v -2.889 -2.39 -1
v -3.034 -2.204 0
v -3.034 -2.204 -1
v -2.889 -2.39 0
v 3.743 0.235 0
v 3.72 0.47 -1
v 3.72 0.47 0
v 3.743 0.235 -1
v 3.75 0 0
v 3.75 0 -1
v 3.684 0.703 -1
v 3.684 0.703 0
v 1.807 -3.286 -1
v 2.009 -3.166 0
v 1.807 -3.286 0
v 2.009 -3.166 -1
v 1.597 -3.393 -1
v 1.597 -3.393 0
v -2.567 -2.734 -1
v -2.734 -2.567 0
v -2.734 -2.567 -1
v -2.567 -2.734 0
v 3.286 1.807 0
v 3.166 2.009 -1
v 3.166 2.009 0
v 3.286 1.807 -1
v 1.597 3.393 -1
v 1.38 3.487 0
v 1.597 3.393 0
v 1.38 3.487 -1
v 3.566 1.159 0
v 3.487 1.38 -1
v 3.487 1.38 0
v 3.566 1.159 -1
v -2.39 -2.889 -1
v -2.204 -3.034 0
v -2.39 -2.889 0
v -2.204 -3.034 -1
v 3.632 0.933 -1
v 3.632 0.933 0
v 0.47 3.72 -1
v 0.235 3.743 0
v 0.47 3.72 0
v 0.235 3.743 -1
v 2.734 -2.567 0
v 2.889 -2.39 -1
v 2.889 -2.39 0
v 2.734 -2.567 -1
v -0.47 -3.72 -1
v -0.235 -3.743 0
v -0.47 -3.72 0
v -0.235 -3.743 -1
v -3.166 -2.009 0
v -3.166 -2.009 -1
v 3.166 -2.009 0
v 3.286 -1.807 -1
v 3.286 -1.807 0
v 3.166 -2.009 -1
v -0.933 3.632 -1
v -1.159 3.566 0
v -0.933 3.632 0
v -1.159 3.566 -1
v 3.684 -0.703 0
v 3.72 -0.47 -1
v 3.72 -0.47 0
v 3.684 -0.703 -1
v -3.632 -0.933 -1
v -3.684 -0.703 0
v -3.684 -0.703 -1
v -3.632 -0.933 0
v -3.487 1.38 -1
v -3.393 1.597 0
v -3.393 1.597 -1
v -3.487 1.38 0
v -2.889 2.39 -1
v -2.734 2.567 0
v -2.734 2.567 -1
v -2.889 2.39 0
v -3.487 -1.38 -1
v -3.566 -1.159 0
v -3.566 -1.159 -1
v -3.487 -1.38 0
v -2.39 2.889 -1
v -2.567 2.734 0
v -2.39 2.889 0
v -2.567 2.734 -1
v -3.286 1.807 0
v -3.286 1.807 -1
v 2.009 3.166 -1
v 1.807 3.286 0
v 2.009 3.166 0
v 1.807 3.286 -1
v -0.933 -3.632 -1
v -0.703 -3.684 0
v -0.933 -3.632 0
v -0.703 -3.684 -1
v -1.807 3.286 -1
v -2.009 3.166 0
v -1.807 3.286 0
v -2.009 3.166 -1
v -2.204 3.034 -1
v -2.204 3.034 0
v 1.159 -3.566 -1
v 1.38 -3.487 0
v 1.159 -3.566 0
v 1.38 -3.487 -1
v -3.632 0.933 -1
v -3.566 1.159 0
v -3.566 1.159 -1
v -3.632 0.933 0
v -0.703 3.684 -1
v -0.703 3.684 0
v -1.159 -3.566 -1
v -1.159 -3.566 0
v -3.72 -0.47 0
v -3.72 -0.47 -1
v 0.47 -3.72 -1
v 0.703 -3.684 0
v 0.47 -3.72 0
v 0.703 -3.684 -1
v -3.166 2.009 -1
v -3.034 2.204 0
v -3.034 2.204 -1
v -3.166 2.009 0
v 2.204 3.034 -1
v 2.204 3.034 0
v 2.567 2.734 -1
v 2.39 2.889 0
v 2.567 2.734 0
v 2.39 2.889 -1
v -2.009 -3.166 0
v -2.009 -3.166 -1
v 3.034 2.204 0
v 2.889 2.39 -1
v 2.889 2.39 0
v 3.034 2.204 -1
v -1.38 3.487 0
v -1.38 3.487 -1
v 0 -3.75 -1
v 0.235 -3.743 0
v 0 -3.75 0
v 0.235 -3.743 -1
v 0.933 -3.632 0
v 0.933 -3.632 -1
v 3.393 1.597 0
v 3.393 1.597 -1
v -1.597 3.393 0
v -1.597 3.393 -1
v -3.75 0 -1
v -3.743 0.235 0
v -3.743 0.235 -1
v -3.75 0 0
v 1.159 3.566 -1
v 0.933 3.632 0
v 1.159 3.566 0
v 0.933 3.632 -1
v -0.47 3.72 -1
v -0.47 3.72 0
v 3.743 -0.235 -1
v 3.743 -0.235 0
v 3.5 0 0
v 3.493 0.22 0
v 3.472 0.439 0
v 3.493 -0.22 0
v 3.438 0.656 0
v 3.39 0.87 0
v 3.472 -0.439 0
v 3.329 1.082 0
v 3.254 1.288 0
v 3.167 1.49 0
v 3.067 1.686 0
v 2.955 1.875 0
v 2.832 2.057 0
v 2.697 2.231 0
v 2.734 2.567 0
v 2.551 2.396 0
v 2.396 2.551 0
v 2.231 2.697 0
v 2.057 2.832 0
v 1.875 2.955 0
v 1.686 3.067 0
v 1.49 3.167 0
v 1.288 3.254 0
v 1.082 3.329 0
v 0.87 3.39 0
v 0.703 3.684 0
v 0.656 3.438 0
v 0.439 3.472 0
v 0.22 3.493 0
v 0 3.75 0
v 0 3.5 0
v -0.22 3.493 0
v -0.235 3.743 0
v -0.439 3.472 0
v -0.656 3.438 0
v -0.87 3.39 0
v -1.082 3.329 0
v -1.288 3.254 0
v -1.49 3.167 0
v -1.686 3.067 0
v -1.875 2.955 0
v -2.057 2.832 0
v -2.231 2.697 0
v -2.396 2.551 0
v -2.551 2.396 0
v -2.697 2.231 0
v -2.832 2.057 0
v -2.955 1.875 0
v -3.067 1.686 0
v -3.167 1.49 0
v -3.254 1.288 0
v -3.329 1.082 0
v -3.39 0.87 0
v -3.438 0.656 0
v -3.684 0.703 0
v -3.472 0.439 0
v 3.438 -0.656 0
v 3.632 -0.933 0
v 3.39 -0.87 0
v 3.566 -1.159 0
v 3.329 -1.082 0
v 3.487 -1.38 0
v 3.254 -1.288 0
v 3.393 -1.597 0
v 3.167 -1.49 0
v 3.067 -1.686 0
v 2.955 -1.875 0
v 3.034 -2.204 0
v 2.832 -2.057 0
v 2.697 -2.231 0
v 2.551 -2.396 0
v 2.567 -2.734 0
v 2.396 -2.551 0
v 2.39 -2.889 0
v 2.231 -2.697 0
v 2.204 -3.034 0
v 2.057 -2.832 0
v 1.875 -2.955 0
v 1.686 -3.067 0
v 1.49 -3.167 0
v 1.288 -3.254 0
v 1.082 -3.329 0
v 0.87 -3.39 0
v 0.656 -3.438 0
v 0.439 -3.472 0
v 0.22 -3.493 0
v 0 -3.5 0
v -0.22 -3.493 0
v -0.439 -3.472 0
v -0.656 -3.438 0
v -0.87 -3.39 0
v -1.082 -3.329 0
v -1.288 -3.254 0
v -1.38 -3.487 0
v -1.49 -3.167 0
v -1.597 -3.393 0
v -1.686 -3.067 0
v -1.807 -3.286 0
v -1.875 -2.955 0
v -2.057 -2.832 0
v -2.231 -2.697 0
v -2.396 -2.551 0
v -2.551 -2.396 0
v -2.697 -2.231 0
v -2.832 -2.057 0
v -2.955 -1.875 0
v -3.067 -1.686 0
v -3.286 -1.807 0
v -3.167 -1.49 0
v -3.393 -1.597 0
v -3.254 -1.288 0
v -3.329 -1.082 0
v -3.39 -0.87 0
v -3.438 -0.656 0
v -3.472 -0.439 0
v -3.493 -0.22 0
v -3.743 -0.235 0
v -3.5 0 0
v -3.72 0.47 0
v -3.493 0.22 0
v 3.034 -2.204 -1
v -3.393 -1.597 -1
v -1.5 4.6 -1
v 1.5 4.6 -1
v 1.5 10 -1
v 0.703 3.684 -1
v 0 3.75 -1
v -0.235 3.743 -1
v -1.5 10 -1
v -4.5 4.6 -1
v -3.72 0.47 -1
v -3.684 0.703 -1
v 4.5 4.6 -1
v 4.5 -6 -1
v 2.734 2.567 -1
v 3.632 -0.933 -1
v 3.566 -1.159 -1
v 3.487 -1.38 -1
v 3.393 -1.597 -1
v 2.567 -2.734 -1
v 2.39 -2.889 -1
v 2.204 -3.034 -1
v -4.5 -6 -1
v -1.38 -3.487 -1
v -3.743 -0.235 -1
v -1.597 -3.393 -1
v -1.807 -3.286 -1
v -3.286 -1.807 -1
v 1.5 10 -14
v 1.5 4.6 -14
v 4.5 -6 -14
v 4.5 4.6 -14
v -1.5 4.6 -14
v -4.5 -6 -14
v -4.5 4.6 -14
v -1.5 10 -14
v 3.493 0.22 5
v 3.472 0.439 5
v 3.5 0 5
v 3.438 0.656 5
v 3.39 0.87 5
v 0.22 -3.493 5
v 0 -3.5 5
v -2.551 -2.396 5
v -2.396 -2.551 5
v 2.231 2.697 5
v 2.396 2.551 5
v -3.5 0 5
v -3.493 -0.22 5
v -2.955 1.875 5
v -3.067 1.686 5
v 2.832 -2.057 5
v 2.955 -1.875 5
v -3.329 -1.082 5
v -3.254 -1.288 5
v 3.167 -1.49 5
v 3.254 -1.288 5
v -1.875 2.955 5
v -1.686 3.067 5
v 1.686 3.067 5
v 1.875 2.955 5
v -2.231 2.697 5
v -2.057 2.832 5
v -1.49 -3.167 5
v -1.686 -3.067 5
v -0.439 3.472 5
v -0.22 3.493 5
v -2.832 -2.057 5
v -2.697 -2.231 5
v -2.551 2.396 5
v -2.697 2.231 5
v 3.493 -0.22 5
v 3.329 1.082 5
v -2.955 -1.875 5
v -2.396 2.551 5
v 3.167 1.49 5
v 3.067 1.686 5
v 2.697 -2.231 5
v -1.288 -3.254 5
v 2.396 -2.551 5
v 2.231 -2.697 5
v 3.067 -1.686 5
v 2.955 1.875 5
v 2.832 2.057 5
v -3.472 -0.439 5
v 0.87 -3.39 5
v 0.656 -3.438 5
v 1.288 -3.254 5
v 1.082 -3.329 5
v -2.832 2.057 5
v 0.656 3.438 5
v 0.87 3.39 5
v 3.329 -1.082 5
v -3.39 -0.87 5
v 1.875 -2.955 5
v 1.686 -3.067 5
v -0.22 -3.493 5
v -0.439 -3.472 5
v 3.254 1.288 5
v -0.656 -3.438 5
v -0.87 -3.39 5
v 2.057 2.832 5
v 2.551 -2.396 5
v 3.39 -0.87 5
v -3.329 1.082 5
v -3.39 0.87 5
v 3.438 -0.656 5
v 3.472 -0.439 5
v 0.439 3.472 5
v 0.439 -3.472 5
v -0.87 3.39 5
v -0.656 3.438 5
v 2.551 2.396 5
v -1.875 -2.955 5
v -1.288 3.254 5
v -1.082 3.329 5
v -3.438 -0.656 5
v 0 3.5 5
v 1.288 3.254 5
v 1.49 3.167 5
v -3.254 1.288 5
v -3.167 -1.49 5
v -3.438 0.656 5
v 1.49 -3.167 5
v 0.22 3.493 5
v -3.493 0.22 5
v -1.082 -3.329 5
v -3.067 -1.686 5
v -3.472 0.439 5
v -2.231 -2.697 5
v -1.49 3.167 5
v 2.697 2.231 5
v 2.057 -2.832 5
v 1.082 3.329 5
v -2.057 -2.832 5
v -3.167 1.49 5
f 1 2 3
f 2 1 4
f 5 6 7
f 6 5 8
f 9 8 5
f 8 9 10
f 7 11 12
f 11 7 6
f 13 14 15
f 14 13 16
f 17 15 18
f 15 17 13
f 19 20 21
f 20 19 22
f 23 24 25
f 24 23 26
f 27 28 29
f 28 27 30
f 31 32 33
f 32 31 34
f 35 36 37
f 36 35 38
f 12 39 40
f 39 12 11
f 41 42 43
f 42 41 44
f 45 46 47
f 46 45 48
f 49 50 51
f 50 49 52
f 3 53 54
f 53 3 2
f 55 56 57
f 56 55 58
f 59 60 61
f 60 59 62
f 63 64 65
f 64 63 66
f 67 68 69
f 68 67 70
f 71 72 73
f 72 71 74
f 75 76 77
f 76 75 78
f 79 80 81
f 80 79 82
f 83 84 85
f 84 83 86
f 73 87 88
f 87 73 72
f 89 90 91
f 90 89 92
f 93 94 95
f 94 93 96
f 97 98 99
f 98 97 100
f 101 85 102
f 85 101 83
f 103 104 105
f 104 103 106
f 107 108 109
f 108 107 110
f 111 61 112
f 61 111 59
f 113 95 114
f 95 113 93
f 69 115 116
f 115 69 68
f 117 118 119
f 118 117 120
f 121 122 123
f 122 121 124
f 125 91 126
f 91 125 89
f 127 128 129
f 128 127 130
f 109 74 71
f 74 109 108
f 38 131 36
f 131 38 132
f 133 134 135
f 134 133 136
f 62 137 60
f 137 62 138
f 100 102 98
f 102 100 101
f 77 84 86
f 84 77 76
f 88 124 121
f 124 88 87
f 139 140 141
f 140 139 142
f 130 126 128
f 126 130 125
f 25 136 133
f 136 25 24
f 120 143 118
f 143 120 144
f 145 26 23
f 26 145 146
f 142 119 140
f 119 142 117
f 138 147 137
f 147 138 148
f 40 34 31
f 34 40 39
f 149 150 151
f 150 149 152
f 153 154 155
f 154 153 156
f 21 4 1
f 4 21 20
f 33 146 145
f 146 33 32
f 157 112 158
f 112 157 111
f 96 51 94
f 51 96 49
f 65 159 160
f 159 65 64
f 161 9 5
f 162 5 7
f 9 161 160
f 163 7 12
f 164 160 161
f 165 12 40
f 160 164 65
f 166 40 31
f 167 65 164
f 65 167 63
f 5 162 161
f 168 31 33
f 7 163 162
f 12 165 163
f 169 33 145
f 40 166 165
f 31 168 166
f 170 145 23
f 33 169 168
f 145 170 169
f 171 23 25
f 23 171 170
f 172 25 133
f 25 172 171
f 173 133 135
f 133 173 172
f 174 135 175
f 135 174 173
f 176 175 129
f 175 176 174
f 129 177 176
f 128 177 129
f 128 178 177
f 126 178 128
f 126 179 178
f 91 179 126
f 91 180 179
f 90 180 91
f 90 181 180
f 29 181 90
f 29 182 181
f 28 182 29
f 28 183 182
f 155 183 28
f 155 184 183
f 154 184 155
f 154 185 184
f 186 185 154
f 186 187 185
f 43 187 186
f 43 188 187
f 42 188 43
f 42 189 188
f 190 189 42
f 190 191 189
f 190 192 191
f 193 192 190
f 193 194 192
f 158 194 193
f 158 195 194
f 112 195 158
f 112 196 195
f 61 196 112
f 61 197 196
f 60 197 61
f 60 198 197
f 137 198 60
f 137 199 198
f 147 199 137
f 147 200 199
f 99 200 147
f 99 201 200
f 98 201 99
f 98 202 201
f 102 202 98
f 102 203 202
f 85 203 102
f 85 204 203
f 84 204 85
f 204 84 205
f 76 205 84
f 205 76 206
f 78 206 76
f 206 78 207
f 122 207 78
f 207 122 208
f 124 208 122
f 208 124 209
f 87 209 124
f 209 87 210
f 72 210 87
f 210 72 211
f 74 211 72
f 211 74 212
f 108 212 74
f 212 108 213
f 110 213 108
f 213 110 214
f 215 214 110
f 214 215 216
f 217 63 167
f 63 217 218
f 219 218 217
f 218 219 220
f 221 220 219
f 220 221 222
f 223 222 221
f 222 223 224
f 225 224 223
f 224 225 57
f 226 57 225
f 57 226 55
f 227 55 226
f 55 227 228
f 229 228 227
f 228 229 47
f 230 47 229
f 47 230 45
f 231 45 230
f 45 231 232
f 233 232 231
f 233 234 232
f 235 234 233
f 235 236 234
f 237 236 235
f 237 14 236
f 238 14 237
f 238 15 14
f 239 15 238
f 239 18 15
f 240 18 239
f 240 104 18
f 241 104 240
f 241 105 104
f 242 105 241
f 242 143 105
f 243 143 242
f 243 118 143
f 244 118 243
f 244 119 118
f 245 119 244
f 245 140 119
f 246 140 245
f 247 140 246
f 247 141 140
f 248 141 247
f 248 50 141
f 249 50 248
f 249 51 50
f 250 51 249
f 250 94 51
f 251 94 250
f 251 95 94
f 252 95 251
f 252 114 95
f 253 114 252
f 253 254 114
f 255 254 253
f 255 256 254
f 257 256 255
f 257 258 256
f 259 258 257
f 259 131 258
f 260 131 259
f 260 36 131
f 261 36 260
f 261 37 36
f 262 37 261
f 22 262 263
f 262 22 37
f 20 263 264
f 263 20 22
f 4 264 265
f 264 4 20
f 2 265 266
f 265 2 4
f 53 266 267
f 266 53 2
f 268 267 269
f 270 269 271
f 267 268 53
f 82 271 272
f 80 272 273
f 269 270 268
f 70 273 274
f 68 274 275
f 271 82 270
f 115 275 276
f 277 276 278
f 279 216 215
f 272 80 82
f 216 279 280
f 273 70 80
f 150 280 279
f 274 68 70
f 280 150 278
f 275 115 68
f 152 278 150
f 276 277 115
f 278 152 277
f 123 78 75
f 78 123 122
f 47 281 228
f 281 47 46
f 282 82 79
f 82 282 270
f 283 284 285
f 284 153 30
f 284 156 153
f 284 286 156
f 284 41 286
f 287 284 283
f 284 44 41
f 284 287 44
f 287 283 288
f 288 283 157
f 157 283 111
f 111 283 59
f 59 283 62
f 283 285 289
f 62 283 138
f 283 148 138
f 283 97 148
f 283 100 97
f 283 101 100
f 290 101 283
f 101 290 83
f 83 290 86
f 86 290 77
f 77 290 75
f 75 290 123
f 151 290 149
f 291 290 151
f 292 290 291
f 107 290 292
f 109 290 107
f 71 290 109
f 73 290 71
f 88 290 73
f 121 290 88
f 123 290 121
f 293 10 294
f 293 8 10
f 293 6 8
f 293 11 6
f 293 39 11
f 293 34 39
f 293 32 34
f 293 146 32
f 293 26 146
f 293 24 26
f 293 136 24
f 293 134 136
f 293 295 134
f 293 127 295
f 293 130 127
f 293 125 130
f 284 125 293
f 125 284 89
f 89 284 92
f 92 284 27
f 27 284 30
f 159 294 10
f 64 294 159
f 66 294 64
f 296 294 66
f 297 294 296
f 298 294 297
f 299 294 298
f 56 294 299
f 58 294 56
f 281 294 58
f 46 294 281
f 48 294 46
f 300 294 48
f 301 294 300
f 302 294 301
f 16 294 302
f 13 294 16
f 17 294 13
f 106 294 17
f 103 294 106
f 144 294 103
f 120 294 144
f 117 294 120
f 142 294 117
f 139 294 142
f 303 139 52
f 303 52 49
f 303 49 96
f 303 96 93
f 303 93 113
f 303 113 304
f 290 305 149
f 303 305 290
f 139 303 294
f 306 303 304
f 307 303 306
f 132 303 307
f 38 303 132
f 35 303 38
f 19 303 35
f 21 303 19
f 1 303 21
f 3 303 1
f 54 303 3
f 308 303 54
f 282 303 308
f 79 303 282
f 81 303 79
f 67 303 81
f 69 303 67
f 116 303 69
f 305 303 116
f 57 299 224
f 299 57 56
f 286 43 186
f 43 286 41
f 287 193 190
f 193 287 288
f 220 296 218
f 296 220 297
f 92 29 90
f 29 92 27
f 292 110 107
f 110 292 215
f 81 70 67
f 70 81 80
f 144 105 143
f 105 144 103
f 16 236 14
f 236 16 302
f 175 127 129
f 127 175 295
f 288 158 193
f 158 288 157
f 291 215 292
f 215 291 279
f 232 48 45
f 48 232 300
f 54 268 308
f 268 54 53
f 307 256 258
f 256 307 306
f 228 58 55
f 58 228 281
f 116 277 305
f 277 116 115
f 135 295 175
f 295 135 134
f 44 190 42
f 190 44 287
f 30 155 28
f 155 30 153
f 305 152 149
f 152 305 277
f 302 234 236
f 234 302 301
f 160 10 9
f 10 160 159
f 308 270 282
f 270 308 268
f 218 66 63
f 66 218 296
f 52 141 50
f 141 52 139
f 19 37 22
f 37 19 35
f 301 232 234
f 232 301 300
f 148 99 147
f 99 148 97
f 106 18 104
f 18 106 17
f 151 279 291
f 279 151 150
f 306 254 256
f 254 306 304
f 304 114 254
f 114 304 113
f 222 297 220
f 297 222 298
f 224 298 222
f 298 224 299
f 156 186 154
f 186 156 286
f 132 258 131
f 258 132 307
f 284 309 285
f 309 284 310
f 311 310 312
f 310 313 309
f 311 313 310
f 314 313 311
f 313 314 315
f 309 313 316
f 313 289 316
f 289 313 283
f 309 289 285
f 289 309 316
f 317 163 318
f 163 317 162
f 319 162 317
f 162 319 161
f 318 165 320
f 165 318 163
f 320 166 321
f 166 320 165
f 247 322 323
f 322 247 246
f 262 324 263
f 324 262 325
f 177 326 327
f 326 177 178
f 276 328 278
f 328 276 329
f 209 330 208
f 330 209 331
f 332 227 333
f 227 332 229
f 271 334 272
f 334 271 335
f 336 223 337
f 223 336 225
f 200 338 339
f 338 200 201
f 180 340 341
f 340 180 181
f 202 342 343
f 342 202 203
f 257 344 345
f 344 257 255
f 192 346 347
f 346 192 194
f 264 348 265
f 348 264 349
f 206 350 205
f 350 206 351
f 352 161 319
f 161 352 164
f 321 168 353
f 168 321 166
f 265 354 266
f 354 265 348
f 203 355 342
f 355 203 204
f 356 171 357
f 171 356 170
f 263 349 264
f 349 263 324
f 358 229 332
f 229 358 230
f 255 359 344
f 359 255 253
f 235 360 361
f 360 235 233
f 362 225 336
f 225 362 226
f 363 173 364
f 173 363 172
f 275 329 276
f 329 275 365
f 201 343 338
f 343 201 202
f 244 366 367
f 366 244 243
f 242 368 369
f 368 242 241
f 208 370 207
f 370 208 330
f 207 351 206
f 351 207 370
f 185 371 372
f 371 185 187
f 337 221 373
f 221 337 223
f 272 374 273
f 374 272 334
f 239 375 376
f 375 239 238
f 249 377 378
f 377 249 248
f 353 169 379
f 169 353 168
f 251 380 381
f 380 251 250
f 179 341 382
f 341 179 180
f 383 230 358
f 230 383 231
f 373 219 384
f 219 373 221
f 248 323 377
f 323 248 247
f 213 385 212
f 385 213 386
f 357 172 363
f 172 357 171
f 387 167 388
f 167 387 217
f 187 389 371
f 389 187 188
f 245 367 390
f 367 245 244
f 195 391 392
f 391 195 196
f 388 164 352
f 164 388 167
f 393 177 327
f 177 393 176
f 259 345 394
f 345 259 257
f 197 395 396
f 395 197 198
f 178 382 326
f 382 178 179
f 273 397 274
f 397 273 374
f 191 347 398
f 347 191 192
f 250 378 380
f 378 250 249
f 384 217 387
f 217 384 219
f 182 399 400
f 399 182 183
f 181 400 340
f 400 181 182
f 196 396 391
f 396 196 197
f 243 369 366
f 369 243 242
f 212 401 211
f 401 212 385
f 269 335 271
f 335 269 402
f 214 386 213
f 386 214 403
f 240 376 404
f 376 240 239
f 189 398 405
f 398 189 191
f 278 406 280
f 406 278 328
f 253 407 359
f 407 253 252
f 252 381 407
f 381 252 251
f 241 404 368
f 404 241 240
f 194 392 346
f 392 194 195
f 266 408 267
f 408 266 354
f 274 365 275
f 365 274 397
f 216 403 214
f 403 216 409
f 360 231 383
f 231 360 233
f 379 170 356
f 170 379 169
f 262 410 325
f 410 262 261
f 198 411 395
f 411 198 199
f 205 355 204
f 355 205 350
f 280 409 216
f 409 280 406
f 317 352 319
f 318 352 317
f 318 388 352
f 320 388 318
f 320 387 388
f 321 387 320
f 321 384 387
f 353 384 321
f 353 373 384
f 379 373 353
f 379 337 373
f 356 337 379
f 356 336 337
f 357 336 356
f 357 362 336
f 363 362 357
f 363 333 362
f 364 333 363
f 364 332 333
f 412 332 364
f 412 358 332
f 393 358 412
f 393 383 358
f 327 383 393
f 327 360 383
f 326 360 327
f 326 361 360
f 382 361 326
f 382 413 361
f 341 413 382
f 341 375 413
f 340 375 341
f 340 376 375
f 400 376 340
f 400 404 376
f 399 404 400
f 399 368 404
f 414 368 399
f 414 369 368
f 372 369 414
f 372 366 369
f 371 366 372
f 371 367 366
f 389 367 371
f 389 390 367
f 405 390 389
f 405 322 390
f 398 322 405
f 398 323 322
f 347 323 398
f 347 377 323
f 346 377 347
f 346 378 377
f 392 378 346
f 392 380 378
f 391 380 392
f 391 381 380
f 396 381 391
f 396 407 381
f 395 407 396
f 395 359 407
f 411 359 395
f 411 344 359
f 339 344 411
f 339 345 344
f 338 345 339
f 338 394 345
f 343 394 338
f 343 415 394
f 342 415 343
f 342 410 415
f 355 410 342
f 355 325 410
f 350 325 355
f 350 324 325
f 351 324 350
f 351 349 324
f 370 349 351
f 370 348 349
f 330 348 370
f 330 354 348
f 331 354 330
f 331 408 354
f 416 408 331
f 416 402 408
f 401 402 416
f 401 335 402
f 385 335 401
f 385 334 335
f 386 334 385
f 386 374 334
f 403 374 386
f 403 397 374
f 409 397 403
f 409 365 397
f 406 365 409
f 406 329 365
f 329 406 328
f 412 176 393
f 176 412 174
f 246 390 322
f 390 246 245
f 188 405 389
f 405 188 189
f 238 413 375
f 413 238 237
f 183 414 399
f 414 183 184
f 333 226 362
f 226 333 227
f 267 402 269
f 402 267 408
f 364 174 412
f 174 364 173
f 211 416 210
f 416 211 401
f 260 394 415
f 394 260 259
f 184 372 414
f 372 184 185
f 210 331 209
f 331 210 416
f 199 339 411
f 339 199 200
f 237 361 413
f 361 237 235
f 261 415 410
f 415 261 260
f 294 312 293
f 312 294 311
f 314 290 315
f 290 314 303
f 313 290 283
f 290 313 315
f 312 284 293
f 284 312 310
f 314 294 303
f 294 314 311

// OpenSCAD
$fn=100; 

module jack_35mm(x, y, r){
    
    
    translate([0, 0, 2.5]){
        cylinder(r=3.5, h=5, center=true);
        
    }
    
    translate([0, 0, -0.5]) {
    
        cylinder(r=3.75, h=1, center=true);
        
        translate([-1.5, 0, -13.5]){
            cube([3, 10, 13]);
        }
    }
    
    
    translate([-4.5, -6, -14]){
        cube([9, 10.6, 13]);
    }
    

}

jack_35mm(0, 0, 0);
